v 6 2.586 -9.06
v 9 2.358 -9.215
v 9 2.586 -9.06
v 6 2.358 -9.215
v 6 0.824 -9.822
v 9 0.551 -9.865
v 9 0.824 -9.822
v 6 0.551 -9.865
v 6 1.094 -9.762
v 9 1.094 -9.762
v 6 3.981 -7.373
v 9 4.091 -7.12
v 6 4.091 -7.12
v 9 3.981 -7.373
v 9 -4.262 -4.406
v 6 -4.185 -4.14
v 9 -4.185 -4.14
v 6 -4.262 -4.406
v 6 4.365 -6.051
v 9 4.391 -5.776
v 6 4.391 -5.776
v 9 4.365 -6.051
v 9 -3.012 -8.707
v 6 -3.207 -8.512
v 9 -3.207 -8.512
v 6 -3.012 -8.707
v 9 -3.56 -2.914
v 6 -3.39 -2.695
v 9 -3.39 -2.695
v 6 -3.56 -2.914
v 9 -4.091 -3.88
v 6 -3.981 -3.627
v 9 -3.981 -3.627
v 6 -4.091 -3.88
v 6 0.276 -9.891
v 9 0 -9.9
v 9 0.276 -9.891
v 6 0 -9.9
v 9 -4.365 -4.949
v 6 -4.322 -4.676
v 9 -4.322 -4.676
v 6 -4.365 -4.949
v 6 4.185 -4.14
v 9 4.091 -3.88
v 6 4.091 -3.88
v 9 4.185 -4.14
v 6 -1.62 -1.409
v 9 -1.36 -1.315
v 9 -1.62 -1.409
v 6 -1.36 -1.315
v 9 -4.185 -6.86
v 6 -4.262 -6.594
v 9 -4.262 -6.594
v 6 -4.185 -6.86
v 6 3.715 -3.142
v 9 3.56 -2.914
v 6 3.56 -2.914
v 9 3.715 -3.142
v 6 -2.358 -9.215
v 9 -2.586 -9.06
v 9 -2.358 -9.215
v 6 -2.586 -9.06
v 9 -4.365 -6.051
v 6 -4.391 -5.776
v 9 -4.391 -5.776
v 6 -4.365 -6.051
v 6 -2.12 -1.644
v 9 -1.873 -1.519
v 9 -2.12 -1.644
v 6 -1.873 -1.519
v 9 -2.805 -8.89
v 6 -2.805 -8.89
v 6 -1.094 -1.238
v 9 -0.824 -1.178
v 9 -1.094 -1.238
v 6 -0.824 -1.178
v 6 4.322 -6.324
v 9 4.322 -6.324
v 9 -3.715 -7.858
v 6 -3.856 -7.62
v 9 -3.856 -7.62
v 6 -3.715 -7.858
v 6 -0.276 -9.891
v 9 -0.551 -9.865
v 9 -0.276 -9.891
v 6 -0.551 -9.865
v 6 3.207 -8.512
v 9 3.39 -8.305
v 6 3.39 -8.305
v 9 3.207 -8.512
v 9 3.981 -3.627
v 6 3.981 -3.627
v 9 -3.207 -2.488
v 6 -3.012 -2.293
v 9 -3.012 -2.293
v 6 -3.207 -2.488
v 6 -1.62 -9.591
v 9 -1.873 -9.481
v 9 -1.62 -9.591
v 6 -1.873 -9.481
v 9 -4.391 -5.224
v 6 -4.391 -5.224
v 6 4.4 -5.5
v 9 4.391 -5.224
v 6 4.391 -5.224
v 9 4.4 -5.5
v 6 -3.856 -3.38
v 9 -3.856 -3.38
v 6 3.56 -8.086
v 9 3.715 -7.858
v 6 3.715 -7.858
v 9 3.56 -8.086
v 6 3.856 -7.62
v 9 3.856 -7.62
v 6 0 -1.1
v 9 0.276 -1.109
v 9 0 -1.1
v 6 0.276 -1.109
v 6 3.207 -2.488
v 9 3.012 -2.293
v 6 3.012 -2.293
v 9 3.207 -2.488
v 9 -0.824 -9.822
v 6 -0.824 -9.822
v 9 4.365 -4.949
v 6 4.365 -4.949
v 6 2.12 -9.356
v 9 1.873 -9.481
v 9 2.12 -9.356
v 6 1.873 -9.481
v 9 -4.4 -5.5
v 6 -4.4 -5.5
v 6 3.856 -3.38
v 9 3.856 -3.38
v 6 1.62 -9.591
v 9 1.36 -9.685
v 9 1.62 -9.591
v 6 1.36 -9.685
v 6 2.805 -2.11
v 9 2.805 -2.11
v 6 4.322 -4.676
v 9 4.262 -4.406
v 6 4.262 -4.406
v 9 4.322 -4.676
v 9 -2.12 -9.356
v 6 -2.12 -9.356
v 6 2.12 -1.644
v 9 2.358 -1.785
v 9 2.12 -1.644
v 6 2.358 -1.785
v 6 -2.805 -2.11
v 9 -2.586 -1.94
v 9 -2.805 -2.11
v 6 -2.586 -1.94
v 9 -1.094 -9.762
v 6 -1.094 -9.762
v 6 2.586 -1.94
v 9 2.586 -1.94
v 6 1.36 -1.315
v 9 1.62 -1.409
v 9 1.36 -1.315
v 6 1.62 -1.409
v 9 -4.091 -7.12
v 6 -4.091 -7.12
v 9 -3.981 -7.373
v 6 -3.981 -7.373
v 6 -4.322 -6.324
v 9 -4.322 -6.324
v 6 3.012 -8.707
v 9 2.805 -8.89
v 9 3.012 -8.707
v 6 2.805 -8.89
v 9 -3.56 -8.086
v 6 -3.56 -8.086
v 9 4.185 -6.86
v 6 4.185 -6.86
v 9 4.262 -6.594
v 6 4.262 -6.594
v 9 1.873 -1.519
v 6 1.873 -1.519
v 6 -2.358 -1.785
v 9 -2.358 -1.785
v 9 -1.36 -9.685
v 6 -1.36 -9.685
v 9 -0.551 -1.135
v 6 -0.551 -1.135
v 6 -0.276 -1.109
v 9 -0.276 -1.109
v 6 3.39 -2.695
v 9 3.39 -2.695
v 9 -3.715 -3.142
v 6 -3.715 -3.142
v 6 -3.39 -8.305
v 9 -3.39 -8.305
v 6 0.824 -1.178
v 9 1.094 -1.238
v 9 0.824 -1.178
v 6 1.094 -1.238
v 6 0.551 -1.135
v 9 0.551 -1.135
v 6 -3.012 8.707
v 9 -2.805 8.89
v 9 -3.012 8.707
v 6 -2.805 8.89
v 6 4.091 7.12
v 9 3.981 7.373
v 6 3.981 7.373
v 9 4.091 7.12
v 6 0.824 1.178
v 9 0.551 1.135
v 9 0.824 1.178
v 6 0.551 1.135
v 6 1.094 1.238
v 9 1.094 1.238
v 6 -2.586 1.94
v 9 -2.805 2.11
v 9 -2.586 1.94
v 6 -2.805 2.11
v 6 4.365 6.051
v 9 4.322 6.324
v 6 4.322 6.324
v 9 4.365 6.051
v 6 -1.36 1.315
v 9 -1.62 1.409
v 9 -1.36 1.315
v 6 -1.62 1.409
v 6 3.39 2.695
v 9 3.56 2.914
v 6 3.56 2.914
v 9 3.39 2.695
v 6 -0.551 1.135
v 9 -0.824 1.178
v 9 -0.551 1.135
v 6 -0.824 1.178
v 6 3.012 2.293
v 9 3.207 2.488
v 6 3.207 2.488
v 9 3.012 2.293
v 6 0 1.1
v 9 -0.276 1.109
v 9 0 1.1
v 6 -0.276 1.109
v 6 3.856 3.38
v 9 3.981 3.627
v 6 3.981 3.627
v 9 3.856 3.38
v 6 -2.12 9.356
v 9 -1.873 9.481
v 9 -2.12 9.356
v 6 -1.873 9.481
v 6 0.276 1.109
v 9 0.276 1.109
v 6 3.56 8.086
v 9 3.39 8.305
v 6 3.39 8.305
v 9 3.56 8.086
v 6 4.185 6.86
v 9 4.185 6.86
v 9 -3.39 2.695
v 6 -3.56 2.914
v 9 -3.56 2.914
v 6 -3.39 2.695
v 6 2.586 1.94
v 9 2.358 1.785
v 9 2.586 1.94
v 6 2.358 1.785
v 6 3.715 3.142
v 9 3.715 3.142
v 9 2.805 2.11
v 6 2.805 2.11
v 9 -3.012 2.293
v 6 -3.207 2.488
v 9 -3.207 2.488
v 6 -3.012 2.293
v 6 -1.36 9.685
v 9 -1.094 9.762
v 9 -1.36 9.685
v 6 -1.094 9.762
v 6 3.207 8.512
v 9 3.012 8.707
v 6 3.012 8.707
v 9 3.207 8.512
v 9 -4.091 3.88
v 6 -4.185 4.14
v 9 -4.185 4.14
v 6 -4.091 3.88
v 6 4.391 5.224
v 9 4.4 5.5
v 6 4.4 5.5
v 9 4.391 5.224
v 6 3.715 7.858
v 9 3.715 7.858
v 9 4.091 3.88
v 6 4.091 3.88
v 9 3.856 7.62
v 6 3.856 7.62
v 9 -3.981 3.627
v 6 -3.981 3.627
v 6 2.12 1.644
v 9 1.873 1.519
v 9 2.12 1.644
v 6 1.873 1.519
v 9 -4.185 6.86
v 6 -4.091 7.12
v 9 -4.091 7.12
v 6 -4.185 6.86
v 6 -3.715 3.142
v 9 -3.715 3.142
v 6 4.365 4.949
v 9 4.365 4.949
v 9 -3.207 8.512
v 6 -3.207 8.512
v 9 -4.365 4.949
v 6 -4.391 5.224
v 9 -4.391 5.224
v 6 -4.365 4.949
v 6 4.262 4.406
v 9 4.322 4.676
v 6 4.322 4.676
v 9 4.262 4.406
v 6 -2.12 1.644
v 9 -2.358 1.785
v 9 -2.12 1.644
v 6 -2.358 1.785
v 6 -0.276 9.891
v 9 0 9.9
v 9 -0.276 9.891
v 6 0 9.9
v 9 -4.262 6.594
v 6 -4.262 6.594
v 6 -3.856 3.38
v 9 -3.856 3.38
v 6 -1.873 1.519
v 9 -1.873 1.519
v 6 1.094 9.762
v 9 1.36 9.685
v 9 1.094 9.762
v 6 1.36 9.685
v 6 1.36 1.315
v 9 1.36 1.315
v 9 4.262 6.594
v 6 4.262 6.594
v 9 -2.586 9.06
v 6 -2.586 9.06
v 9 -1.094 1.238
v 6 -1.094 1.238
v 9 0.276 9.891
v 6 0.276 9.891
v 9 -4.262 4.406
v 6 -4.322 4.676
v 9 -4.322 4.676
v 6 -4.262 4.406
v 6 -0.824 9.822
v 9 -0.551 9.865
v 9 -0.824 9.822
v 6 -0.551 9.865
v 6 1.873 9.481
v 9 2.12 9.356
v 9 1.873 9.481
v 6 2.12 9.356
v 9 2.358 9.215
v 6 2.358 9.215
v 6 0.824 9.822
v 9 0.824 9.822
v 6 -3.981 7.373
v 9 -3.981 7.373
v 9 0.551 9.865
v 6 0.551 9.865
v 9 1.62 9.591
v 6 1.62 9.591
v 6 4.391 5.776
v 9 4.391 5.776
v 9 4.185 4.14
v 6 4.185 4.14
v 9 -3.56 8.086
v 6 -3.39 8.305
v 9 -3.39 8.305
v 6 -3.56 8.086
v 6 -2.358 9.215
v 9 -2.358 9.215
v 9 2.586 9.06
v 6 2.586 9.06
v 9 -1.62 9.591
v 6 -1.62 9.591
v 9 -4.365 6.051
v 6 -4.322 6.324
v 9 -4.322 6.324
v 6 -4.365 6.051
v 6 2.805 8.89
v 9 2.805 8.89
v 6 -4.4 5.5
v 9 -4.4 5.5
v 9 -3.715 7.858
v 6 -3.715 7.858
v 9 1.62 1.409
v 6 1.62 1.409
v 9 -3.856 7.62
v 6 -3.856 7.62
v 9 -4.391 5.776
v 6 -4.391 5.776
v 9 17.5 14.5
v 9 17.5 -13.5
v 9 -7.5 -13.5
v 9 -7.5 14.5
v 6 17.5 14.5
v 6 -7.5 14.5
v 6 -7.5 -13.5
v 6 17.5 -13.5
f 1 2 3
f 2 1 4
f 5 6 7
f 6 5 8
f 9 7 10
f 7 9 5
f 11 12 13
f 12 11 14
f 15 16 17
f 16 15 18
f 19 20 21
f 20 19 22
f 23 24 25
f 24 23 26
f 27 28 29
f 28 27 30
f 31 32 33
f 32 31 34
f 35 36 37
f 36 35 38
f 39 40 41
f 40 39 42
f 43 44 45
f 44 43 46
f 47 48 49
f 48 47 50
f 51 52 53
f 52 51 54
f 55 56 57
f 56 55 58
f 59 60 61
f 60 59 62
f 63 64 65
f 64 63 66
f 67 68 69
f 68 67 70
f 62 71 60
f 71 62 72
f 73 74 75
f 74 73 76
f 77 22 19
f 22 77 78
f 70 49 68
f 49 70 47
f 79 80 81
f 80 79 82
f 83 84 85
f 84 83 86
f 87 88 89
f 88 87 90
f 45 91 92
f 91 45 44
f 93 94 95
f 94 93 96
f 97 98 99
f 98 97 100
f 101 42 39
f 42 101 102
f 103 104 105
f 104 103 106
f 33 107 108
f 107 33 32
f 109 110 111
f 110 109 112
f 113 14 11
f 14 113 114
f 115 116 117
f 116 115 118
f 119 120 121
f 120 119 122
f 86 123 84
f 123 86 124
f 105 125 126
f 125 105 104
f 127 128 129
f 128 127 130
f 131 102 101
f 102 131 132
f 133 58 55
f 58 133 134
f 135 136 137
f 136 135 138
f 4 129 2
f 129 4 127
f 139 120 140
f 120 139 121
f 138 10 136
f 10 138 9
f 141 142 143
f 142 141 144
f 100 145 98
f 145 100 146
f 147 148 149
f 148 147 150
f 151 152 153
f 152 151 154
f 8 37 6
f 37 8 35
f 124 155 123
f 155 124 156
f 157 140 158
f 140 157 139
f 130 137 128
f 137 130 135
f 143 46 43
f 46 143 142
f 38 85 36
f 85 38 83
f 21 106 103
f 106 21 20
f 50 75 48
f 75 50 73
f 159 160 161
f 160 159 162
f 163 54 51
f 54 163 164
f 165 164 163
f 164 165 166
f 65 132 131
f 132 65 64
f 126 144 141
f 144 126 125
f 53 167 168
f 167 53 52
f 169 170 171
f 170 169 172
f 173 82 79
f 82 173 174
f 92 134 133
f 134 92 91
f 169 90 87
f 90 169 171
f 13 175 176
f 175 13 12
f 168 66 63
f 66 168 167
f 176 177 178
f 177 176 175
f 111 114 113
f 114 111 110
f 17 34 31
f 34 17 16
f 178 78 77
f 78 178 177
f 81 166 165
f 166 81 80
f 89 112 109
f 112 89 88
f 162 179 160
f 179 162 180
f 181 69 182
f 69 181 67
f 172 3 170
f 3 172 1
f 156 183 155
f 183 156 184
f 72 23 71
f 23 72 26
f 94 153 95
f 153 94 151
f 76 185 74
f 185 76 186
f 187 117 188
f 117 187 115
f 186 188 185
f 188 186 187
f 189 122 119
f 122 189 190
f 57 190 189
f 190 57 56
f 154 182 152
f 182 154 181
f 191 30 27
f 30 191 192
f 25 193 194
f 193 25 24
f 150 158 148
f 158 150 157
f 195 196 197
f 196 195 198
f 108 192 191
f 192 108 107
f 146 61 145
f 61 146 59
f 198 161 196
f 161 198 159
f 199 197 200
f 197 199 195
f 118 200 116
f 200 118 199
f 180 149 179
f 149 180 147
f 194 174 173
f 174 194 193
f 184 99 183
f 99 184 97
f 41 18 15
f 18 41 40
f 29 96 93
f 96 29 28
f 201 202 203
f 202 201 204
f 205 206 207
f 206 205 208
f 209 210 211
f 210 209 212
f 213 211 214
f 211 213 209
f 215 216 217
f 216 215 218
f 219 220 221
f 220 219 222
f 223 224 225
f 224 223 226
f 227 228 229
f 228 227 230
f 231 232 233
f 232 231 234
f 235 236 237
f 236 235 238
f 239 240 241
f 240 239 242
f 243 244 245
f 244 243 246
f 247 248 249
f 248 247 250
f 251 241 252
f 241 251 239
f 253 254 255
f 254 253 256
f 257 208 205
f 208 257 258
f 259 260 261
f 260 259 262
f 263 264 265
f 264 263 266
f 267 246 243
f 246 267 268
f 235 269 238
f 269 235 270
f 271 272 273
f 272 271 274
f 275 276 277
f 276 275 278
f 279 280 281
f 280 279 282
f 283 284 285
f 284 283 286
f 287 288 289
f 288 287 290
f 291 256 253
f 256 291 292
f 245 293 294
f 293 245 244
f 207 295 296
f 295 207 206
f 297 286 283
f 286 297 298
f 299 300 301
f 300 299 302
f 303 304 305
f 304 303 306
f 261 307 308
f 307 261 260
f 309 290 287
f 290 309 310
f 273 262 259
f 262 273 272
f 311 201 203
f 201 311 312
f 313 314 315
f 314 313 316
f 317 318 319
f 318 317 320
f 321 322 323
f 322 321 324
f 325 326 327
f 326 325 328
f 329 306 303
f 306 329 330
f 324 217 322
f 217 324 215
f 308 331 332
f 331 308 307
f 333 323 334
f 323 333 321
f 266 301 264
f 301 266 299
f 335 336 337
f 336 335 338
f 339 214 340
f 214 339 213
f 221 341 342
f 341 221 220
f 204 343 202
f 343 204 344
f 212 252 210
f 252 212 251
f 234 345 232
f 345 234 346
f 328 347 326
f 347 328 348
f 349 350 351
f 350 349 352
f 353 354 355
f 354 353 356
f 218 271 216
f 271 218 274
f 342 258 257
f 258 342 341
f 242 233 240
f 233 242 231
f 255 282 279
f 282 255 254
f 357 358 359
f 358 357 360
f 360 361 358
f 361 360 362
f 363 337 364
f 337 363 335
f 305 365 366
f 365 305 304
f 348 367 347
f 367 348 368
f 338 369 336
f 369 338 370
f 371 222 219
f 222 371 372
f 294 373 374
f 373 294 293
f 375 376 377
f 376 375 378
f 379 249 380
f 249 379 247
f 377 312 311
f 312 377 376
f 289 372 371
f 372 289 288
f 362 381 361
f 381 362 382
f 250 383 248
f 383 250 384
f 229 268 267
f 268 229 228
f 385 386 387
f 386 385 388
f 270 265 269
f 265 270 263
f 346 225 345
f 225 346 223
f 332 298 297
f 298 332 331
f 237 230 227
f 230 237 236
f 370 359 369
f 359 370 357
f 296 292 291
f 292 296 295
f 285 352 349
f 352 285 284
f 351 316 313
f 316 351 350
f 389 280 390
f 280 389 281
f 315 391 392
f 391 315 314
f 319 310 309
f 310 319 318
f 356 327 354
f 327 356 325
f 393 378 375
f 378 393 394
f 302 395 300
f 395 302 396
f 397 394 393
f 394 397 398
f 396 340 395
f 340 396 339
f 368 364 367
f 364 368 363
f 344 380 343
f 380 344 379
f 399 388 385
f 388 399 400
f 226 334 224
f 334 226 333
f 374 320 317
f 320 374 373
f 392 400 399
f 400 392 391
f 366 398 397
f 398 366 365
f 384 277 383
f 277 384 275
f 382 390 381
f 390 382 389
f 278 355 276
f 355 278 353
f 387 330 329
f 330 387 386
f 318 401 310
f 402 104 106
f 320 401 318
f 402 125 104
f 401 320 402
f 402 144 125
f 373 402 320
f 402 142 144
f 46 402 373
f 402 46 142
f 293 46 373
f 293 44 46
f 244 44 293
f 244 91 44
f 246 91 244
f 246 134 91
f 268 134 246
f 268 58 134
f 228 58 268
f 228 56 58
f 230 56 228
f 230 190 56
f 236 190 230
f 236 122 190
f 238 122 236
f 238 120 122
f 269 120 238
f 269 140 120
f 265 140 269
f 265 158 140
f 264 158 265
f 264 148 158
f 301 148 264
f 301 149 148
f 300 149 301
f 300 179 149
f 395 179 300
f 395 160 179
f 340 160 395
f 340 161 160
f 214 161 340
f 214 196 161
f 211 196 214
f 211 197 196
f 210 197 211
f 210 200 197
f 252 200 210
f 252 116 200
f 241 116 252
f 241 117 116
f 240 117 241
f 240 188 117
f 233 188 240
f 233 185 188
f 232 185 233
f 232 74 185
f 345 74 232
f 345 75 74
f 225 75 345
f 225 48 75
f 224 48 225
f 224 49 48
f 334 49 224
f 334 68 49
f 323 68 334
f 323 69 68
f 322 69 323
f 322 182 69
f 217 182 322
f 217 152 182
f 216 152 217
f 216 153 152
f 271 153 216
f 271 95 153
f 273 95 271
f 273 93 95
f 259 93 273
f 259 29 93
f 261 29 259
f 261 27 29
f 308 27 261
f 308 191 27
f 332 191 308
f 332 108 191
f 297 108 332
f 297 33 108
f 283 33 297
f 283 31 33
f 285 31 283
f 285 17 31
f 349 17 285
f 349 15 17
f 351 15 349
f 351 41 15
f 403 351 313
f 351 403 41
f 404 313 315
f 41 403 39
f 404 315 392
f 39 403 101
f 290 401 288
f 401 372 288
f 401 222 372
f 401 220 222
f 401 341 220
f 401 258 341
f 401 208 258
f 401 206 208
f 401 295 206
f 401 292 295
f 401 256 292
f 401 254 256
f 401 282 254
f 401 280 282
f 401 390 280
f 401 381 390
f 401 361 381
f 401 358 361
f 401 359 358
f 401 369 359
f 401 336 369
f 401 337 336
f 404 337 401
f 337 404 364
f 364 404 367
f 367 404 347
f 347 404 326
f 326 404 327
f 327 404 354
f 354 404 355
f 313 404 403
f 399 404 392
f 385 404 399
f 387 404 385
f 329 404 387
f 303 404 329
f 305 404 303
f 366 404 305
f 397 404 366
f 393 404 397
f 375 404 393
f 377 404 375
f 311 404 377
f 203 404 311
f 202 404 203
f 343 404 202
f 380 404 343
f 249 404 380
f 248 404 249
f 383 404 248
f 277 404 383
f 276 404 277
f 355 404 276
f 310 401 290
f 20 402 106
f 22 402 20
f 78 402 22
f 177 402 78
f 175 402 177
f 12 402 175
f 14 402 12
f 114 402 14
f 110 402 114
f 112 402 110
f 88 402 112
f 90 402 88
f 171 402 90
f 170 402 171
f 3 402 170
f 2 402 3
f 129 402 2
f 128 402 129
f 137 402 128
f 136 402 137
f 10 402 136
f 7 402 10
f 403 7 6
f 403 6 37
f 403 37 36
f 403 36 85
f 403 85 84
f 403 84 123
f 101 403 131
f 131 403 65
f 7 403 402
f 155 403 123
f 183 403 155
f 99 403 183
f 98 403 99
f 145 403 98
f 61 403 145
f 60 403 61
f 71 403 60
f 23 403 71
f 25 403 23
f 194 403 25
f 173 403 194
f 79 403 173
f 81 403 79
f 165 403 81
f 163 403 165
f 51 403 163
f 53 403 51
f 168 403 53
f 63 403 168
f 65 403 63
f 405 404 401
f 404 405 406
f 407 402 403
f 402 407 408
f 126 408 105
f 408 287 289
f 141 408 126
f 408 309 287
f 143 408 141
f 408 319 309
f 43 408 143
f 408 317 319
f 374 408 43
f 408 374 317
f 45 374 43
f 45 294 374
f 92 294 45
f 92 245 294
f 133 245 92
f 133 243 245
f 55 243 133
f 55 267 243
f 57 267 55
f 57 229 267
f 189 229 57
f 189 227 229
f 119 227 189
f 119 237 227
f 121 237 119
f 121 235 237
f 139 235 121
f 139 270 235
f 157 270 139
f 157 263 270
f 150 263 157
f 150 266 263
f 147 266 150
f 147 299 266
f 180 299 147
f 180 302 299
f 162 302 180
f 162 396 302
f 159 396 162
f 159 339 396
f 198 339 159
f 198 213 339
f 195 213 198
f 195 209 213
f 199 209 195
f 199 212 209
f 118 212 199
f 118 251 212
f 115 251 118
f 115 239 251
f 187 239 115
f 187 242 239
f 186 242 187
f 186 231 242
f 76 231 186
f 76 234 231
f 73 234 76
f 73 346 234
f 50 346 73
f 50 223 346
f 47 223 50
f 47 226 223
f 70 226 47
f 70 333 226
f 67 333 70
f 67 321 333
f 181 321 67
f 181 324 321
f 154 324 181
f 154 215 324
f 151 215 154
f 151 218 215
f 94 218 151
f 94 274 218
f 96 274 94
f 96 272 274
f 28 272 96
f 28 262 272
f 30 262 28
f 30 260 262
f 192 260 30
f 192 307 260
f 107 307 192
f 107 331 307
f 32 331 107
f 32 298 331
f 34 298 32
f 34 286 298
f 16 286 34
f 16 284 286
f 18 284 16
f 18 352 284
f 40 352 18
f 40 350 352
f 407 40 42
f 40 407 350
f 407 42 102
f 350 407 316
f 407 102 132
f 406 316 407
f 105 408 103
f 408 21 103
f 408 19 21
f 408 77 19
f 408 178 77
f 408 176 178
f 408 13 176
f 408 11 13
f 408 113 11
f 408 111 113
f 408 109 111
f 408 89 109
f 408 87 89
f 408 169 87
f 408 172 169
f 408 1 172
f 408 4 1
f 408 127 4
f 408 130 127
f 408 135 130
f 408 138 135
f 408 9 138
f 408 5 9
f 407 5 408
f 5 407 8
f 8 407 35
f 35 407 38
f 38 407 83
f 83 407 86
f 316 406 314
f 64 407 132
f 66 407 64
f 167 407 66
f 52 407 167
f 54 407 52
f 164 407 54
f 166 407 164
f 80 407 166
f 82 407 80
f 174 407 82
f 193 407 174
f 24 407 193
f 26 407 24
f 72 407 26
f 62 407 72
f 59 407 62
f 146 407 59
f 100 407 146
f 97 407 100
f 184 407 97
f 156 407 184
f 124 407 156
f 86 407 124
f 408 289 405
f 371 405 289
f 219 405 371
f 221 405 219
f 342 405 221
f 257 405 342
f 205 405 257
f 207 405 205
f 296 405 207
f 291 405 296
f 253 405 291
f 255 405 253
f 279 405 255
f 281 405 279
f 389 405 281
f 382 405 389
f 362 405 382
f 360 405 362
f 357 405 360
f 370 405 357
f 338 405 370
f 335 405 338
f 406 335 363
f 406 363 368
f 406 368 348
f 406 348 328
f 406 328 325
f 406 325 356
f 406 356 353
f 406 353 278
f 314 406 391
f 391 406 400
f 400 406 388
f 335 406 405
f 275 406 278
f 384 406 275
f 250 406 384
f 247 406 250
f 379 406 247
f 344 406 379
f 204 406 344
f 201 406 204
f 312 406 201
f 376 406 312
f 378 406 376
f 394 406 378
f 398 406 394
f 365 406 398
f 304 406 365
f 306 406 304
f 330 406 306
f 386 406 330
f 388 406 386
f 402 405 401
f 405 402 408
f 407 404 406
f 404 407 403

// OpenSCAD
difference(){
	union(){
        translate([6,-7.5,-9.5-4]){
            cube([3,25,28], center=false);
        }

        

	}
	union() {
        translate([-20,0,0-5.5]){
            rotate([0,90,0]){
                color("red")
                cylinder(h=200, r=4.4, $fn=100, center=false);
            }
        }
        translate([-20,0,0+5.5]){
            rotate([0,90,0]){
                color("red")
                cylinder(h=200, r=4.4, $fn=100, center=false);
            }
        }


	}
}
